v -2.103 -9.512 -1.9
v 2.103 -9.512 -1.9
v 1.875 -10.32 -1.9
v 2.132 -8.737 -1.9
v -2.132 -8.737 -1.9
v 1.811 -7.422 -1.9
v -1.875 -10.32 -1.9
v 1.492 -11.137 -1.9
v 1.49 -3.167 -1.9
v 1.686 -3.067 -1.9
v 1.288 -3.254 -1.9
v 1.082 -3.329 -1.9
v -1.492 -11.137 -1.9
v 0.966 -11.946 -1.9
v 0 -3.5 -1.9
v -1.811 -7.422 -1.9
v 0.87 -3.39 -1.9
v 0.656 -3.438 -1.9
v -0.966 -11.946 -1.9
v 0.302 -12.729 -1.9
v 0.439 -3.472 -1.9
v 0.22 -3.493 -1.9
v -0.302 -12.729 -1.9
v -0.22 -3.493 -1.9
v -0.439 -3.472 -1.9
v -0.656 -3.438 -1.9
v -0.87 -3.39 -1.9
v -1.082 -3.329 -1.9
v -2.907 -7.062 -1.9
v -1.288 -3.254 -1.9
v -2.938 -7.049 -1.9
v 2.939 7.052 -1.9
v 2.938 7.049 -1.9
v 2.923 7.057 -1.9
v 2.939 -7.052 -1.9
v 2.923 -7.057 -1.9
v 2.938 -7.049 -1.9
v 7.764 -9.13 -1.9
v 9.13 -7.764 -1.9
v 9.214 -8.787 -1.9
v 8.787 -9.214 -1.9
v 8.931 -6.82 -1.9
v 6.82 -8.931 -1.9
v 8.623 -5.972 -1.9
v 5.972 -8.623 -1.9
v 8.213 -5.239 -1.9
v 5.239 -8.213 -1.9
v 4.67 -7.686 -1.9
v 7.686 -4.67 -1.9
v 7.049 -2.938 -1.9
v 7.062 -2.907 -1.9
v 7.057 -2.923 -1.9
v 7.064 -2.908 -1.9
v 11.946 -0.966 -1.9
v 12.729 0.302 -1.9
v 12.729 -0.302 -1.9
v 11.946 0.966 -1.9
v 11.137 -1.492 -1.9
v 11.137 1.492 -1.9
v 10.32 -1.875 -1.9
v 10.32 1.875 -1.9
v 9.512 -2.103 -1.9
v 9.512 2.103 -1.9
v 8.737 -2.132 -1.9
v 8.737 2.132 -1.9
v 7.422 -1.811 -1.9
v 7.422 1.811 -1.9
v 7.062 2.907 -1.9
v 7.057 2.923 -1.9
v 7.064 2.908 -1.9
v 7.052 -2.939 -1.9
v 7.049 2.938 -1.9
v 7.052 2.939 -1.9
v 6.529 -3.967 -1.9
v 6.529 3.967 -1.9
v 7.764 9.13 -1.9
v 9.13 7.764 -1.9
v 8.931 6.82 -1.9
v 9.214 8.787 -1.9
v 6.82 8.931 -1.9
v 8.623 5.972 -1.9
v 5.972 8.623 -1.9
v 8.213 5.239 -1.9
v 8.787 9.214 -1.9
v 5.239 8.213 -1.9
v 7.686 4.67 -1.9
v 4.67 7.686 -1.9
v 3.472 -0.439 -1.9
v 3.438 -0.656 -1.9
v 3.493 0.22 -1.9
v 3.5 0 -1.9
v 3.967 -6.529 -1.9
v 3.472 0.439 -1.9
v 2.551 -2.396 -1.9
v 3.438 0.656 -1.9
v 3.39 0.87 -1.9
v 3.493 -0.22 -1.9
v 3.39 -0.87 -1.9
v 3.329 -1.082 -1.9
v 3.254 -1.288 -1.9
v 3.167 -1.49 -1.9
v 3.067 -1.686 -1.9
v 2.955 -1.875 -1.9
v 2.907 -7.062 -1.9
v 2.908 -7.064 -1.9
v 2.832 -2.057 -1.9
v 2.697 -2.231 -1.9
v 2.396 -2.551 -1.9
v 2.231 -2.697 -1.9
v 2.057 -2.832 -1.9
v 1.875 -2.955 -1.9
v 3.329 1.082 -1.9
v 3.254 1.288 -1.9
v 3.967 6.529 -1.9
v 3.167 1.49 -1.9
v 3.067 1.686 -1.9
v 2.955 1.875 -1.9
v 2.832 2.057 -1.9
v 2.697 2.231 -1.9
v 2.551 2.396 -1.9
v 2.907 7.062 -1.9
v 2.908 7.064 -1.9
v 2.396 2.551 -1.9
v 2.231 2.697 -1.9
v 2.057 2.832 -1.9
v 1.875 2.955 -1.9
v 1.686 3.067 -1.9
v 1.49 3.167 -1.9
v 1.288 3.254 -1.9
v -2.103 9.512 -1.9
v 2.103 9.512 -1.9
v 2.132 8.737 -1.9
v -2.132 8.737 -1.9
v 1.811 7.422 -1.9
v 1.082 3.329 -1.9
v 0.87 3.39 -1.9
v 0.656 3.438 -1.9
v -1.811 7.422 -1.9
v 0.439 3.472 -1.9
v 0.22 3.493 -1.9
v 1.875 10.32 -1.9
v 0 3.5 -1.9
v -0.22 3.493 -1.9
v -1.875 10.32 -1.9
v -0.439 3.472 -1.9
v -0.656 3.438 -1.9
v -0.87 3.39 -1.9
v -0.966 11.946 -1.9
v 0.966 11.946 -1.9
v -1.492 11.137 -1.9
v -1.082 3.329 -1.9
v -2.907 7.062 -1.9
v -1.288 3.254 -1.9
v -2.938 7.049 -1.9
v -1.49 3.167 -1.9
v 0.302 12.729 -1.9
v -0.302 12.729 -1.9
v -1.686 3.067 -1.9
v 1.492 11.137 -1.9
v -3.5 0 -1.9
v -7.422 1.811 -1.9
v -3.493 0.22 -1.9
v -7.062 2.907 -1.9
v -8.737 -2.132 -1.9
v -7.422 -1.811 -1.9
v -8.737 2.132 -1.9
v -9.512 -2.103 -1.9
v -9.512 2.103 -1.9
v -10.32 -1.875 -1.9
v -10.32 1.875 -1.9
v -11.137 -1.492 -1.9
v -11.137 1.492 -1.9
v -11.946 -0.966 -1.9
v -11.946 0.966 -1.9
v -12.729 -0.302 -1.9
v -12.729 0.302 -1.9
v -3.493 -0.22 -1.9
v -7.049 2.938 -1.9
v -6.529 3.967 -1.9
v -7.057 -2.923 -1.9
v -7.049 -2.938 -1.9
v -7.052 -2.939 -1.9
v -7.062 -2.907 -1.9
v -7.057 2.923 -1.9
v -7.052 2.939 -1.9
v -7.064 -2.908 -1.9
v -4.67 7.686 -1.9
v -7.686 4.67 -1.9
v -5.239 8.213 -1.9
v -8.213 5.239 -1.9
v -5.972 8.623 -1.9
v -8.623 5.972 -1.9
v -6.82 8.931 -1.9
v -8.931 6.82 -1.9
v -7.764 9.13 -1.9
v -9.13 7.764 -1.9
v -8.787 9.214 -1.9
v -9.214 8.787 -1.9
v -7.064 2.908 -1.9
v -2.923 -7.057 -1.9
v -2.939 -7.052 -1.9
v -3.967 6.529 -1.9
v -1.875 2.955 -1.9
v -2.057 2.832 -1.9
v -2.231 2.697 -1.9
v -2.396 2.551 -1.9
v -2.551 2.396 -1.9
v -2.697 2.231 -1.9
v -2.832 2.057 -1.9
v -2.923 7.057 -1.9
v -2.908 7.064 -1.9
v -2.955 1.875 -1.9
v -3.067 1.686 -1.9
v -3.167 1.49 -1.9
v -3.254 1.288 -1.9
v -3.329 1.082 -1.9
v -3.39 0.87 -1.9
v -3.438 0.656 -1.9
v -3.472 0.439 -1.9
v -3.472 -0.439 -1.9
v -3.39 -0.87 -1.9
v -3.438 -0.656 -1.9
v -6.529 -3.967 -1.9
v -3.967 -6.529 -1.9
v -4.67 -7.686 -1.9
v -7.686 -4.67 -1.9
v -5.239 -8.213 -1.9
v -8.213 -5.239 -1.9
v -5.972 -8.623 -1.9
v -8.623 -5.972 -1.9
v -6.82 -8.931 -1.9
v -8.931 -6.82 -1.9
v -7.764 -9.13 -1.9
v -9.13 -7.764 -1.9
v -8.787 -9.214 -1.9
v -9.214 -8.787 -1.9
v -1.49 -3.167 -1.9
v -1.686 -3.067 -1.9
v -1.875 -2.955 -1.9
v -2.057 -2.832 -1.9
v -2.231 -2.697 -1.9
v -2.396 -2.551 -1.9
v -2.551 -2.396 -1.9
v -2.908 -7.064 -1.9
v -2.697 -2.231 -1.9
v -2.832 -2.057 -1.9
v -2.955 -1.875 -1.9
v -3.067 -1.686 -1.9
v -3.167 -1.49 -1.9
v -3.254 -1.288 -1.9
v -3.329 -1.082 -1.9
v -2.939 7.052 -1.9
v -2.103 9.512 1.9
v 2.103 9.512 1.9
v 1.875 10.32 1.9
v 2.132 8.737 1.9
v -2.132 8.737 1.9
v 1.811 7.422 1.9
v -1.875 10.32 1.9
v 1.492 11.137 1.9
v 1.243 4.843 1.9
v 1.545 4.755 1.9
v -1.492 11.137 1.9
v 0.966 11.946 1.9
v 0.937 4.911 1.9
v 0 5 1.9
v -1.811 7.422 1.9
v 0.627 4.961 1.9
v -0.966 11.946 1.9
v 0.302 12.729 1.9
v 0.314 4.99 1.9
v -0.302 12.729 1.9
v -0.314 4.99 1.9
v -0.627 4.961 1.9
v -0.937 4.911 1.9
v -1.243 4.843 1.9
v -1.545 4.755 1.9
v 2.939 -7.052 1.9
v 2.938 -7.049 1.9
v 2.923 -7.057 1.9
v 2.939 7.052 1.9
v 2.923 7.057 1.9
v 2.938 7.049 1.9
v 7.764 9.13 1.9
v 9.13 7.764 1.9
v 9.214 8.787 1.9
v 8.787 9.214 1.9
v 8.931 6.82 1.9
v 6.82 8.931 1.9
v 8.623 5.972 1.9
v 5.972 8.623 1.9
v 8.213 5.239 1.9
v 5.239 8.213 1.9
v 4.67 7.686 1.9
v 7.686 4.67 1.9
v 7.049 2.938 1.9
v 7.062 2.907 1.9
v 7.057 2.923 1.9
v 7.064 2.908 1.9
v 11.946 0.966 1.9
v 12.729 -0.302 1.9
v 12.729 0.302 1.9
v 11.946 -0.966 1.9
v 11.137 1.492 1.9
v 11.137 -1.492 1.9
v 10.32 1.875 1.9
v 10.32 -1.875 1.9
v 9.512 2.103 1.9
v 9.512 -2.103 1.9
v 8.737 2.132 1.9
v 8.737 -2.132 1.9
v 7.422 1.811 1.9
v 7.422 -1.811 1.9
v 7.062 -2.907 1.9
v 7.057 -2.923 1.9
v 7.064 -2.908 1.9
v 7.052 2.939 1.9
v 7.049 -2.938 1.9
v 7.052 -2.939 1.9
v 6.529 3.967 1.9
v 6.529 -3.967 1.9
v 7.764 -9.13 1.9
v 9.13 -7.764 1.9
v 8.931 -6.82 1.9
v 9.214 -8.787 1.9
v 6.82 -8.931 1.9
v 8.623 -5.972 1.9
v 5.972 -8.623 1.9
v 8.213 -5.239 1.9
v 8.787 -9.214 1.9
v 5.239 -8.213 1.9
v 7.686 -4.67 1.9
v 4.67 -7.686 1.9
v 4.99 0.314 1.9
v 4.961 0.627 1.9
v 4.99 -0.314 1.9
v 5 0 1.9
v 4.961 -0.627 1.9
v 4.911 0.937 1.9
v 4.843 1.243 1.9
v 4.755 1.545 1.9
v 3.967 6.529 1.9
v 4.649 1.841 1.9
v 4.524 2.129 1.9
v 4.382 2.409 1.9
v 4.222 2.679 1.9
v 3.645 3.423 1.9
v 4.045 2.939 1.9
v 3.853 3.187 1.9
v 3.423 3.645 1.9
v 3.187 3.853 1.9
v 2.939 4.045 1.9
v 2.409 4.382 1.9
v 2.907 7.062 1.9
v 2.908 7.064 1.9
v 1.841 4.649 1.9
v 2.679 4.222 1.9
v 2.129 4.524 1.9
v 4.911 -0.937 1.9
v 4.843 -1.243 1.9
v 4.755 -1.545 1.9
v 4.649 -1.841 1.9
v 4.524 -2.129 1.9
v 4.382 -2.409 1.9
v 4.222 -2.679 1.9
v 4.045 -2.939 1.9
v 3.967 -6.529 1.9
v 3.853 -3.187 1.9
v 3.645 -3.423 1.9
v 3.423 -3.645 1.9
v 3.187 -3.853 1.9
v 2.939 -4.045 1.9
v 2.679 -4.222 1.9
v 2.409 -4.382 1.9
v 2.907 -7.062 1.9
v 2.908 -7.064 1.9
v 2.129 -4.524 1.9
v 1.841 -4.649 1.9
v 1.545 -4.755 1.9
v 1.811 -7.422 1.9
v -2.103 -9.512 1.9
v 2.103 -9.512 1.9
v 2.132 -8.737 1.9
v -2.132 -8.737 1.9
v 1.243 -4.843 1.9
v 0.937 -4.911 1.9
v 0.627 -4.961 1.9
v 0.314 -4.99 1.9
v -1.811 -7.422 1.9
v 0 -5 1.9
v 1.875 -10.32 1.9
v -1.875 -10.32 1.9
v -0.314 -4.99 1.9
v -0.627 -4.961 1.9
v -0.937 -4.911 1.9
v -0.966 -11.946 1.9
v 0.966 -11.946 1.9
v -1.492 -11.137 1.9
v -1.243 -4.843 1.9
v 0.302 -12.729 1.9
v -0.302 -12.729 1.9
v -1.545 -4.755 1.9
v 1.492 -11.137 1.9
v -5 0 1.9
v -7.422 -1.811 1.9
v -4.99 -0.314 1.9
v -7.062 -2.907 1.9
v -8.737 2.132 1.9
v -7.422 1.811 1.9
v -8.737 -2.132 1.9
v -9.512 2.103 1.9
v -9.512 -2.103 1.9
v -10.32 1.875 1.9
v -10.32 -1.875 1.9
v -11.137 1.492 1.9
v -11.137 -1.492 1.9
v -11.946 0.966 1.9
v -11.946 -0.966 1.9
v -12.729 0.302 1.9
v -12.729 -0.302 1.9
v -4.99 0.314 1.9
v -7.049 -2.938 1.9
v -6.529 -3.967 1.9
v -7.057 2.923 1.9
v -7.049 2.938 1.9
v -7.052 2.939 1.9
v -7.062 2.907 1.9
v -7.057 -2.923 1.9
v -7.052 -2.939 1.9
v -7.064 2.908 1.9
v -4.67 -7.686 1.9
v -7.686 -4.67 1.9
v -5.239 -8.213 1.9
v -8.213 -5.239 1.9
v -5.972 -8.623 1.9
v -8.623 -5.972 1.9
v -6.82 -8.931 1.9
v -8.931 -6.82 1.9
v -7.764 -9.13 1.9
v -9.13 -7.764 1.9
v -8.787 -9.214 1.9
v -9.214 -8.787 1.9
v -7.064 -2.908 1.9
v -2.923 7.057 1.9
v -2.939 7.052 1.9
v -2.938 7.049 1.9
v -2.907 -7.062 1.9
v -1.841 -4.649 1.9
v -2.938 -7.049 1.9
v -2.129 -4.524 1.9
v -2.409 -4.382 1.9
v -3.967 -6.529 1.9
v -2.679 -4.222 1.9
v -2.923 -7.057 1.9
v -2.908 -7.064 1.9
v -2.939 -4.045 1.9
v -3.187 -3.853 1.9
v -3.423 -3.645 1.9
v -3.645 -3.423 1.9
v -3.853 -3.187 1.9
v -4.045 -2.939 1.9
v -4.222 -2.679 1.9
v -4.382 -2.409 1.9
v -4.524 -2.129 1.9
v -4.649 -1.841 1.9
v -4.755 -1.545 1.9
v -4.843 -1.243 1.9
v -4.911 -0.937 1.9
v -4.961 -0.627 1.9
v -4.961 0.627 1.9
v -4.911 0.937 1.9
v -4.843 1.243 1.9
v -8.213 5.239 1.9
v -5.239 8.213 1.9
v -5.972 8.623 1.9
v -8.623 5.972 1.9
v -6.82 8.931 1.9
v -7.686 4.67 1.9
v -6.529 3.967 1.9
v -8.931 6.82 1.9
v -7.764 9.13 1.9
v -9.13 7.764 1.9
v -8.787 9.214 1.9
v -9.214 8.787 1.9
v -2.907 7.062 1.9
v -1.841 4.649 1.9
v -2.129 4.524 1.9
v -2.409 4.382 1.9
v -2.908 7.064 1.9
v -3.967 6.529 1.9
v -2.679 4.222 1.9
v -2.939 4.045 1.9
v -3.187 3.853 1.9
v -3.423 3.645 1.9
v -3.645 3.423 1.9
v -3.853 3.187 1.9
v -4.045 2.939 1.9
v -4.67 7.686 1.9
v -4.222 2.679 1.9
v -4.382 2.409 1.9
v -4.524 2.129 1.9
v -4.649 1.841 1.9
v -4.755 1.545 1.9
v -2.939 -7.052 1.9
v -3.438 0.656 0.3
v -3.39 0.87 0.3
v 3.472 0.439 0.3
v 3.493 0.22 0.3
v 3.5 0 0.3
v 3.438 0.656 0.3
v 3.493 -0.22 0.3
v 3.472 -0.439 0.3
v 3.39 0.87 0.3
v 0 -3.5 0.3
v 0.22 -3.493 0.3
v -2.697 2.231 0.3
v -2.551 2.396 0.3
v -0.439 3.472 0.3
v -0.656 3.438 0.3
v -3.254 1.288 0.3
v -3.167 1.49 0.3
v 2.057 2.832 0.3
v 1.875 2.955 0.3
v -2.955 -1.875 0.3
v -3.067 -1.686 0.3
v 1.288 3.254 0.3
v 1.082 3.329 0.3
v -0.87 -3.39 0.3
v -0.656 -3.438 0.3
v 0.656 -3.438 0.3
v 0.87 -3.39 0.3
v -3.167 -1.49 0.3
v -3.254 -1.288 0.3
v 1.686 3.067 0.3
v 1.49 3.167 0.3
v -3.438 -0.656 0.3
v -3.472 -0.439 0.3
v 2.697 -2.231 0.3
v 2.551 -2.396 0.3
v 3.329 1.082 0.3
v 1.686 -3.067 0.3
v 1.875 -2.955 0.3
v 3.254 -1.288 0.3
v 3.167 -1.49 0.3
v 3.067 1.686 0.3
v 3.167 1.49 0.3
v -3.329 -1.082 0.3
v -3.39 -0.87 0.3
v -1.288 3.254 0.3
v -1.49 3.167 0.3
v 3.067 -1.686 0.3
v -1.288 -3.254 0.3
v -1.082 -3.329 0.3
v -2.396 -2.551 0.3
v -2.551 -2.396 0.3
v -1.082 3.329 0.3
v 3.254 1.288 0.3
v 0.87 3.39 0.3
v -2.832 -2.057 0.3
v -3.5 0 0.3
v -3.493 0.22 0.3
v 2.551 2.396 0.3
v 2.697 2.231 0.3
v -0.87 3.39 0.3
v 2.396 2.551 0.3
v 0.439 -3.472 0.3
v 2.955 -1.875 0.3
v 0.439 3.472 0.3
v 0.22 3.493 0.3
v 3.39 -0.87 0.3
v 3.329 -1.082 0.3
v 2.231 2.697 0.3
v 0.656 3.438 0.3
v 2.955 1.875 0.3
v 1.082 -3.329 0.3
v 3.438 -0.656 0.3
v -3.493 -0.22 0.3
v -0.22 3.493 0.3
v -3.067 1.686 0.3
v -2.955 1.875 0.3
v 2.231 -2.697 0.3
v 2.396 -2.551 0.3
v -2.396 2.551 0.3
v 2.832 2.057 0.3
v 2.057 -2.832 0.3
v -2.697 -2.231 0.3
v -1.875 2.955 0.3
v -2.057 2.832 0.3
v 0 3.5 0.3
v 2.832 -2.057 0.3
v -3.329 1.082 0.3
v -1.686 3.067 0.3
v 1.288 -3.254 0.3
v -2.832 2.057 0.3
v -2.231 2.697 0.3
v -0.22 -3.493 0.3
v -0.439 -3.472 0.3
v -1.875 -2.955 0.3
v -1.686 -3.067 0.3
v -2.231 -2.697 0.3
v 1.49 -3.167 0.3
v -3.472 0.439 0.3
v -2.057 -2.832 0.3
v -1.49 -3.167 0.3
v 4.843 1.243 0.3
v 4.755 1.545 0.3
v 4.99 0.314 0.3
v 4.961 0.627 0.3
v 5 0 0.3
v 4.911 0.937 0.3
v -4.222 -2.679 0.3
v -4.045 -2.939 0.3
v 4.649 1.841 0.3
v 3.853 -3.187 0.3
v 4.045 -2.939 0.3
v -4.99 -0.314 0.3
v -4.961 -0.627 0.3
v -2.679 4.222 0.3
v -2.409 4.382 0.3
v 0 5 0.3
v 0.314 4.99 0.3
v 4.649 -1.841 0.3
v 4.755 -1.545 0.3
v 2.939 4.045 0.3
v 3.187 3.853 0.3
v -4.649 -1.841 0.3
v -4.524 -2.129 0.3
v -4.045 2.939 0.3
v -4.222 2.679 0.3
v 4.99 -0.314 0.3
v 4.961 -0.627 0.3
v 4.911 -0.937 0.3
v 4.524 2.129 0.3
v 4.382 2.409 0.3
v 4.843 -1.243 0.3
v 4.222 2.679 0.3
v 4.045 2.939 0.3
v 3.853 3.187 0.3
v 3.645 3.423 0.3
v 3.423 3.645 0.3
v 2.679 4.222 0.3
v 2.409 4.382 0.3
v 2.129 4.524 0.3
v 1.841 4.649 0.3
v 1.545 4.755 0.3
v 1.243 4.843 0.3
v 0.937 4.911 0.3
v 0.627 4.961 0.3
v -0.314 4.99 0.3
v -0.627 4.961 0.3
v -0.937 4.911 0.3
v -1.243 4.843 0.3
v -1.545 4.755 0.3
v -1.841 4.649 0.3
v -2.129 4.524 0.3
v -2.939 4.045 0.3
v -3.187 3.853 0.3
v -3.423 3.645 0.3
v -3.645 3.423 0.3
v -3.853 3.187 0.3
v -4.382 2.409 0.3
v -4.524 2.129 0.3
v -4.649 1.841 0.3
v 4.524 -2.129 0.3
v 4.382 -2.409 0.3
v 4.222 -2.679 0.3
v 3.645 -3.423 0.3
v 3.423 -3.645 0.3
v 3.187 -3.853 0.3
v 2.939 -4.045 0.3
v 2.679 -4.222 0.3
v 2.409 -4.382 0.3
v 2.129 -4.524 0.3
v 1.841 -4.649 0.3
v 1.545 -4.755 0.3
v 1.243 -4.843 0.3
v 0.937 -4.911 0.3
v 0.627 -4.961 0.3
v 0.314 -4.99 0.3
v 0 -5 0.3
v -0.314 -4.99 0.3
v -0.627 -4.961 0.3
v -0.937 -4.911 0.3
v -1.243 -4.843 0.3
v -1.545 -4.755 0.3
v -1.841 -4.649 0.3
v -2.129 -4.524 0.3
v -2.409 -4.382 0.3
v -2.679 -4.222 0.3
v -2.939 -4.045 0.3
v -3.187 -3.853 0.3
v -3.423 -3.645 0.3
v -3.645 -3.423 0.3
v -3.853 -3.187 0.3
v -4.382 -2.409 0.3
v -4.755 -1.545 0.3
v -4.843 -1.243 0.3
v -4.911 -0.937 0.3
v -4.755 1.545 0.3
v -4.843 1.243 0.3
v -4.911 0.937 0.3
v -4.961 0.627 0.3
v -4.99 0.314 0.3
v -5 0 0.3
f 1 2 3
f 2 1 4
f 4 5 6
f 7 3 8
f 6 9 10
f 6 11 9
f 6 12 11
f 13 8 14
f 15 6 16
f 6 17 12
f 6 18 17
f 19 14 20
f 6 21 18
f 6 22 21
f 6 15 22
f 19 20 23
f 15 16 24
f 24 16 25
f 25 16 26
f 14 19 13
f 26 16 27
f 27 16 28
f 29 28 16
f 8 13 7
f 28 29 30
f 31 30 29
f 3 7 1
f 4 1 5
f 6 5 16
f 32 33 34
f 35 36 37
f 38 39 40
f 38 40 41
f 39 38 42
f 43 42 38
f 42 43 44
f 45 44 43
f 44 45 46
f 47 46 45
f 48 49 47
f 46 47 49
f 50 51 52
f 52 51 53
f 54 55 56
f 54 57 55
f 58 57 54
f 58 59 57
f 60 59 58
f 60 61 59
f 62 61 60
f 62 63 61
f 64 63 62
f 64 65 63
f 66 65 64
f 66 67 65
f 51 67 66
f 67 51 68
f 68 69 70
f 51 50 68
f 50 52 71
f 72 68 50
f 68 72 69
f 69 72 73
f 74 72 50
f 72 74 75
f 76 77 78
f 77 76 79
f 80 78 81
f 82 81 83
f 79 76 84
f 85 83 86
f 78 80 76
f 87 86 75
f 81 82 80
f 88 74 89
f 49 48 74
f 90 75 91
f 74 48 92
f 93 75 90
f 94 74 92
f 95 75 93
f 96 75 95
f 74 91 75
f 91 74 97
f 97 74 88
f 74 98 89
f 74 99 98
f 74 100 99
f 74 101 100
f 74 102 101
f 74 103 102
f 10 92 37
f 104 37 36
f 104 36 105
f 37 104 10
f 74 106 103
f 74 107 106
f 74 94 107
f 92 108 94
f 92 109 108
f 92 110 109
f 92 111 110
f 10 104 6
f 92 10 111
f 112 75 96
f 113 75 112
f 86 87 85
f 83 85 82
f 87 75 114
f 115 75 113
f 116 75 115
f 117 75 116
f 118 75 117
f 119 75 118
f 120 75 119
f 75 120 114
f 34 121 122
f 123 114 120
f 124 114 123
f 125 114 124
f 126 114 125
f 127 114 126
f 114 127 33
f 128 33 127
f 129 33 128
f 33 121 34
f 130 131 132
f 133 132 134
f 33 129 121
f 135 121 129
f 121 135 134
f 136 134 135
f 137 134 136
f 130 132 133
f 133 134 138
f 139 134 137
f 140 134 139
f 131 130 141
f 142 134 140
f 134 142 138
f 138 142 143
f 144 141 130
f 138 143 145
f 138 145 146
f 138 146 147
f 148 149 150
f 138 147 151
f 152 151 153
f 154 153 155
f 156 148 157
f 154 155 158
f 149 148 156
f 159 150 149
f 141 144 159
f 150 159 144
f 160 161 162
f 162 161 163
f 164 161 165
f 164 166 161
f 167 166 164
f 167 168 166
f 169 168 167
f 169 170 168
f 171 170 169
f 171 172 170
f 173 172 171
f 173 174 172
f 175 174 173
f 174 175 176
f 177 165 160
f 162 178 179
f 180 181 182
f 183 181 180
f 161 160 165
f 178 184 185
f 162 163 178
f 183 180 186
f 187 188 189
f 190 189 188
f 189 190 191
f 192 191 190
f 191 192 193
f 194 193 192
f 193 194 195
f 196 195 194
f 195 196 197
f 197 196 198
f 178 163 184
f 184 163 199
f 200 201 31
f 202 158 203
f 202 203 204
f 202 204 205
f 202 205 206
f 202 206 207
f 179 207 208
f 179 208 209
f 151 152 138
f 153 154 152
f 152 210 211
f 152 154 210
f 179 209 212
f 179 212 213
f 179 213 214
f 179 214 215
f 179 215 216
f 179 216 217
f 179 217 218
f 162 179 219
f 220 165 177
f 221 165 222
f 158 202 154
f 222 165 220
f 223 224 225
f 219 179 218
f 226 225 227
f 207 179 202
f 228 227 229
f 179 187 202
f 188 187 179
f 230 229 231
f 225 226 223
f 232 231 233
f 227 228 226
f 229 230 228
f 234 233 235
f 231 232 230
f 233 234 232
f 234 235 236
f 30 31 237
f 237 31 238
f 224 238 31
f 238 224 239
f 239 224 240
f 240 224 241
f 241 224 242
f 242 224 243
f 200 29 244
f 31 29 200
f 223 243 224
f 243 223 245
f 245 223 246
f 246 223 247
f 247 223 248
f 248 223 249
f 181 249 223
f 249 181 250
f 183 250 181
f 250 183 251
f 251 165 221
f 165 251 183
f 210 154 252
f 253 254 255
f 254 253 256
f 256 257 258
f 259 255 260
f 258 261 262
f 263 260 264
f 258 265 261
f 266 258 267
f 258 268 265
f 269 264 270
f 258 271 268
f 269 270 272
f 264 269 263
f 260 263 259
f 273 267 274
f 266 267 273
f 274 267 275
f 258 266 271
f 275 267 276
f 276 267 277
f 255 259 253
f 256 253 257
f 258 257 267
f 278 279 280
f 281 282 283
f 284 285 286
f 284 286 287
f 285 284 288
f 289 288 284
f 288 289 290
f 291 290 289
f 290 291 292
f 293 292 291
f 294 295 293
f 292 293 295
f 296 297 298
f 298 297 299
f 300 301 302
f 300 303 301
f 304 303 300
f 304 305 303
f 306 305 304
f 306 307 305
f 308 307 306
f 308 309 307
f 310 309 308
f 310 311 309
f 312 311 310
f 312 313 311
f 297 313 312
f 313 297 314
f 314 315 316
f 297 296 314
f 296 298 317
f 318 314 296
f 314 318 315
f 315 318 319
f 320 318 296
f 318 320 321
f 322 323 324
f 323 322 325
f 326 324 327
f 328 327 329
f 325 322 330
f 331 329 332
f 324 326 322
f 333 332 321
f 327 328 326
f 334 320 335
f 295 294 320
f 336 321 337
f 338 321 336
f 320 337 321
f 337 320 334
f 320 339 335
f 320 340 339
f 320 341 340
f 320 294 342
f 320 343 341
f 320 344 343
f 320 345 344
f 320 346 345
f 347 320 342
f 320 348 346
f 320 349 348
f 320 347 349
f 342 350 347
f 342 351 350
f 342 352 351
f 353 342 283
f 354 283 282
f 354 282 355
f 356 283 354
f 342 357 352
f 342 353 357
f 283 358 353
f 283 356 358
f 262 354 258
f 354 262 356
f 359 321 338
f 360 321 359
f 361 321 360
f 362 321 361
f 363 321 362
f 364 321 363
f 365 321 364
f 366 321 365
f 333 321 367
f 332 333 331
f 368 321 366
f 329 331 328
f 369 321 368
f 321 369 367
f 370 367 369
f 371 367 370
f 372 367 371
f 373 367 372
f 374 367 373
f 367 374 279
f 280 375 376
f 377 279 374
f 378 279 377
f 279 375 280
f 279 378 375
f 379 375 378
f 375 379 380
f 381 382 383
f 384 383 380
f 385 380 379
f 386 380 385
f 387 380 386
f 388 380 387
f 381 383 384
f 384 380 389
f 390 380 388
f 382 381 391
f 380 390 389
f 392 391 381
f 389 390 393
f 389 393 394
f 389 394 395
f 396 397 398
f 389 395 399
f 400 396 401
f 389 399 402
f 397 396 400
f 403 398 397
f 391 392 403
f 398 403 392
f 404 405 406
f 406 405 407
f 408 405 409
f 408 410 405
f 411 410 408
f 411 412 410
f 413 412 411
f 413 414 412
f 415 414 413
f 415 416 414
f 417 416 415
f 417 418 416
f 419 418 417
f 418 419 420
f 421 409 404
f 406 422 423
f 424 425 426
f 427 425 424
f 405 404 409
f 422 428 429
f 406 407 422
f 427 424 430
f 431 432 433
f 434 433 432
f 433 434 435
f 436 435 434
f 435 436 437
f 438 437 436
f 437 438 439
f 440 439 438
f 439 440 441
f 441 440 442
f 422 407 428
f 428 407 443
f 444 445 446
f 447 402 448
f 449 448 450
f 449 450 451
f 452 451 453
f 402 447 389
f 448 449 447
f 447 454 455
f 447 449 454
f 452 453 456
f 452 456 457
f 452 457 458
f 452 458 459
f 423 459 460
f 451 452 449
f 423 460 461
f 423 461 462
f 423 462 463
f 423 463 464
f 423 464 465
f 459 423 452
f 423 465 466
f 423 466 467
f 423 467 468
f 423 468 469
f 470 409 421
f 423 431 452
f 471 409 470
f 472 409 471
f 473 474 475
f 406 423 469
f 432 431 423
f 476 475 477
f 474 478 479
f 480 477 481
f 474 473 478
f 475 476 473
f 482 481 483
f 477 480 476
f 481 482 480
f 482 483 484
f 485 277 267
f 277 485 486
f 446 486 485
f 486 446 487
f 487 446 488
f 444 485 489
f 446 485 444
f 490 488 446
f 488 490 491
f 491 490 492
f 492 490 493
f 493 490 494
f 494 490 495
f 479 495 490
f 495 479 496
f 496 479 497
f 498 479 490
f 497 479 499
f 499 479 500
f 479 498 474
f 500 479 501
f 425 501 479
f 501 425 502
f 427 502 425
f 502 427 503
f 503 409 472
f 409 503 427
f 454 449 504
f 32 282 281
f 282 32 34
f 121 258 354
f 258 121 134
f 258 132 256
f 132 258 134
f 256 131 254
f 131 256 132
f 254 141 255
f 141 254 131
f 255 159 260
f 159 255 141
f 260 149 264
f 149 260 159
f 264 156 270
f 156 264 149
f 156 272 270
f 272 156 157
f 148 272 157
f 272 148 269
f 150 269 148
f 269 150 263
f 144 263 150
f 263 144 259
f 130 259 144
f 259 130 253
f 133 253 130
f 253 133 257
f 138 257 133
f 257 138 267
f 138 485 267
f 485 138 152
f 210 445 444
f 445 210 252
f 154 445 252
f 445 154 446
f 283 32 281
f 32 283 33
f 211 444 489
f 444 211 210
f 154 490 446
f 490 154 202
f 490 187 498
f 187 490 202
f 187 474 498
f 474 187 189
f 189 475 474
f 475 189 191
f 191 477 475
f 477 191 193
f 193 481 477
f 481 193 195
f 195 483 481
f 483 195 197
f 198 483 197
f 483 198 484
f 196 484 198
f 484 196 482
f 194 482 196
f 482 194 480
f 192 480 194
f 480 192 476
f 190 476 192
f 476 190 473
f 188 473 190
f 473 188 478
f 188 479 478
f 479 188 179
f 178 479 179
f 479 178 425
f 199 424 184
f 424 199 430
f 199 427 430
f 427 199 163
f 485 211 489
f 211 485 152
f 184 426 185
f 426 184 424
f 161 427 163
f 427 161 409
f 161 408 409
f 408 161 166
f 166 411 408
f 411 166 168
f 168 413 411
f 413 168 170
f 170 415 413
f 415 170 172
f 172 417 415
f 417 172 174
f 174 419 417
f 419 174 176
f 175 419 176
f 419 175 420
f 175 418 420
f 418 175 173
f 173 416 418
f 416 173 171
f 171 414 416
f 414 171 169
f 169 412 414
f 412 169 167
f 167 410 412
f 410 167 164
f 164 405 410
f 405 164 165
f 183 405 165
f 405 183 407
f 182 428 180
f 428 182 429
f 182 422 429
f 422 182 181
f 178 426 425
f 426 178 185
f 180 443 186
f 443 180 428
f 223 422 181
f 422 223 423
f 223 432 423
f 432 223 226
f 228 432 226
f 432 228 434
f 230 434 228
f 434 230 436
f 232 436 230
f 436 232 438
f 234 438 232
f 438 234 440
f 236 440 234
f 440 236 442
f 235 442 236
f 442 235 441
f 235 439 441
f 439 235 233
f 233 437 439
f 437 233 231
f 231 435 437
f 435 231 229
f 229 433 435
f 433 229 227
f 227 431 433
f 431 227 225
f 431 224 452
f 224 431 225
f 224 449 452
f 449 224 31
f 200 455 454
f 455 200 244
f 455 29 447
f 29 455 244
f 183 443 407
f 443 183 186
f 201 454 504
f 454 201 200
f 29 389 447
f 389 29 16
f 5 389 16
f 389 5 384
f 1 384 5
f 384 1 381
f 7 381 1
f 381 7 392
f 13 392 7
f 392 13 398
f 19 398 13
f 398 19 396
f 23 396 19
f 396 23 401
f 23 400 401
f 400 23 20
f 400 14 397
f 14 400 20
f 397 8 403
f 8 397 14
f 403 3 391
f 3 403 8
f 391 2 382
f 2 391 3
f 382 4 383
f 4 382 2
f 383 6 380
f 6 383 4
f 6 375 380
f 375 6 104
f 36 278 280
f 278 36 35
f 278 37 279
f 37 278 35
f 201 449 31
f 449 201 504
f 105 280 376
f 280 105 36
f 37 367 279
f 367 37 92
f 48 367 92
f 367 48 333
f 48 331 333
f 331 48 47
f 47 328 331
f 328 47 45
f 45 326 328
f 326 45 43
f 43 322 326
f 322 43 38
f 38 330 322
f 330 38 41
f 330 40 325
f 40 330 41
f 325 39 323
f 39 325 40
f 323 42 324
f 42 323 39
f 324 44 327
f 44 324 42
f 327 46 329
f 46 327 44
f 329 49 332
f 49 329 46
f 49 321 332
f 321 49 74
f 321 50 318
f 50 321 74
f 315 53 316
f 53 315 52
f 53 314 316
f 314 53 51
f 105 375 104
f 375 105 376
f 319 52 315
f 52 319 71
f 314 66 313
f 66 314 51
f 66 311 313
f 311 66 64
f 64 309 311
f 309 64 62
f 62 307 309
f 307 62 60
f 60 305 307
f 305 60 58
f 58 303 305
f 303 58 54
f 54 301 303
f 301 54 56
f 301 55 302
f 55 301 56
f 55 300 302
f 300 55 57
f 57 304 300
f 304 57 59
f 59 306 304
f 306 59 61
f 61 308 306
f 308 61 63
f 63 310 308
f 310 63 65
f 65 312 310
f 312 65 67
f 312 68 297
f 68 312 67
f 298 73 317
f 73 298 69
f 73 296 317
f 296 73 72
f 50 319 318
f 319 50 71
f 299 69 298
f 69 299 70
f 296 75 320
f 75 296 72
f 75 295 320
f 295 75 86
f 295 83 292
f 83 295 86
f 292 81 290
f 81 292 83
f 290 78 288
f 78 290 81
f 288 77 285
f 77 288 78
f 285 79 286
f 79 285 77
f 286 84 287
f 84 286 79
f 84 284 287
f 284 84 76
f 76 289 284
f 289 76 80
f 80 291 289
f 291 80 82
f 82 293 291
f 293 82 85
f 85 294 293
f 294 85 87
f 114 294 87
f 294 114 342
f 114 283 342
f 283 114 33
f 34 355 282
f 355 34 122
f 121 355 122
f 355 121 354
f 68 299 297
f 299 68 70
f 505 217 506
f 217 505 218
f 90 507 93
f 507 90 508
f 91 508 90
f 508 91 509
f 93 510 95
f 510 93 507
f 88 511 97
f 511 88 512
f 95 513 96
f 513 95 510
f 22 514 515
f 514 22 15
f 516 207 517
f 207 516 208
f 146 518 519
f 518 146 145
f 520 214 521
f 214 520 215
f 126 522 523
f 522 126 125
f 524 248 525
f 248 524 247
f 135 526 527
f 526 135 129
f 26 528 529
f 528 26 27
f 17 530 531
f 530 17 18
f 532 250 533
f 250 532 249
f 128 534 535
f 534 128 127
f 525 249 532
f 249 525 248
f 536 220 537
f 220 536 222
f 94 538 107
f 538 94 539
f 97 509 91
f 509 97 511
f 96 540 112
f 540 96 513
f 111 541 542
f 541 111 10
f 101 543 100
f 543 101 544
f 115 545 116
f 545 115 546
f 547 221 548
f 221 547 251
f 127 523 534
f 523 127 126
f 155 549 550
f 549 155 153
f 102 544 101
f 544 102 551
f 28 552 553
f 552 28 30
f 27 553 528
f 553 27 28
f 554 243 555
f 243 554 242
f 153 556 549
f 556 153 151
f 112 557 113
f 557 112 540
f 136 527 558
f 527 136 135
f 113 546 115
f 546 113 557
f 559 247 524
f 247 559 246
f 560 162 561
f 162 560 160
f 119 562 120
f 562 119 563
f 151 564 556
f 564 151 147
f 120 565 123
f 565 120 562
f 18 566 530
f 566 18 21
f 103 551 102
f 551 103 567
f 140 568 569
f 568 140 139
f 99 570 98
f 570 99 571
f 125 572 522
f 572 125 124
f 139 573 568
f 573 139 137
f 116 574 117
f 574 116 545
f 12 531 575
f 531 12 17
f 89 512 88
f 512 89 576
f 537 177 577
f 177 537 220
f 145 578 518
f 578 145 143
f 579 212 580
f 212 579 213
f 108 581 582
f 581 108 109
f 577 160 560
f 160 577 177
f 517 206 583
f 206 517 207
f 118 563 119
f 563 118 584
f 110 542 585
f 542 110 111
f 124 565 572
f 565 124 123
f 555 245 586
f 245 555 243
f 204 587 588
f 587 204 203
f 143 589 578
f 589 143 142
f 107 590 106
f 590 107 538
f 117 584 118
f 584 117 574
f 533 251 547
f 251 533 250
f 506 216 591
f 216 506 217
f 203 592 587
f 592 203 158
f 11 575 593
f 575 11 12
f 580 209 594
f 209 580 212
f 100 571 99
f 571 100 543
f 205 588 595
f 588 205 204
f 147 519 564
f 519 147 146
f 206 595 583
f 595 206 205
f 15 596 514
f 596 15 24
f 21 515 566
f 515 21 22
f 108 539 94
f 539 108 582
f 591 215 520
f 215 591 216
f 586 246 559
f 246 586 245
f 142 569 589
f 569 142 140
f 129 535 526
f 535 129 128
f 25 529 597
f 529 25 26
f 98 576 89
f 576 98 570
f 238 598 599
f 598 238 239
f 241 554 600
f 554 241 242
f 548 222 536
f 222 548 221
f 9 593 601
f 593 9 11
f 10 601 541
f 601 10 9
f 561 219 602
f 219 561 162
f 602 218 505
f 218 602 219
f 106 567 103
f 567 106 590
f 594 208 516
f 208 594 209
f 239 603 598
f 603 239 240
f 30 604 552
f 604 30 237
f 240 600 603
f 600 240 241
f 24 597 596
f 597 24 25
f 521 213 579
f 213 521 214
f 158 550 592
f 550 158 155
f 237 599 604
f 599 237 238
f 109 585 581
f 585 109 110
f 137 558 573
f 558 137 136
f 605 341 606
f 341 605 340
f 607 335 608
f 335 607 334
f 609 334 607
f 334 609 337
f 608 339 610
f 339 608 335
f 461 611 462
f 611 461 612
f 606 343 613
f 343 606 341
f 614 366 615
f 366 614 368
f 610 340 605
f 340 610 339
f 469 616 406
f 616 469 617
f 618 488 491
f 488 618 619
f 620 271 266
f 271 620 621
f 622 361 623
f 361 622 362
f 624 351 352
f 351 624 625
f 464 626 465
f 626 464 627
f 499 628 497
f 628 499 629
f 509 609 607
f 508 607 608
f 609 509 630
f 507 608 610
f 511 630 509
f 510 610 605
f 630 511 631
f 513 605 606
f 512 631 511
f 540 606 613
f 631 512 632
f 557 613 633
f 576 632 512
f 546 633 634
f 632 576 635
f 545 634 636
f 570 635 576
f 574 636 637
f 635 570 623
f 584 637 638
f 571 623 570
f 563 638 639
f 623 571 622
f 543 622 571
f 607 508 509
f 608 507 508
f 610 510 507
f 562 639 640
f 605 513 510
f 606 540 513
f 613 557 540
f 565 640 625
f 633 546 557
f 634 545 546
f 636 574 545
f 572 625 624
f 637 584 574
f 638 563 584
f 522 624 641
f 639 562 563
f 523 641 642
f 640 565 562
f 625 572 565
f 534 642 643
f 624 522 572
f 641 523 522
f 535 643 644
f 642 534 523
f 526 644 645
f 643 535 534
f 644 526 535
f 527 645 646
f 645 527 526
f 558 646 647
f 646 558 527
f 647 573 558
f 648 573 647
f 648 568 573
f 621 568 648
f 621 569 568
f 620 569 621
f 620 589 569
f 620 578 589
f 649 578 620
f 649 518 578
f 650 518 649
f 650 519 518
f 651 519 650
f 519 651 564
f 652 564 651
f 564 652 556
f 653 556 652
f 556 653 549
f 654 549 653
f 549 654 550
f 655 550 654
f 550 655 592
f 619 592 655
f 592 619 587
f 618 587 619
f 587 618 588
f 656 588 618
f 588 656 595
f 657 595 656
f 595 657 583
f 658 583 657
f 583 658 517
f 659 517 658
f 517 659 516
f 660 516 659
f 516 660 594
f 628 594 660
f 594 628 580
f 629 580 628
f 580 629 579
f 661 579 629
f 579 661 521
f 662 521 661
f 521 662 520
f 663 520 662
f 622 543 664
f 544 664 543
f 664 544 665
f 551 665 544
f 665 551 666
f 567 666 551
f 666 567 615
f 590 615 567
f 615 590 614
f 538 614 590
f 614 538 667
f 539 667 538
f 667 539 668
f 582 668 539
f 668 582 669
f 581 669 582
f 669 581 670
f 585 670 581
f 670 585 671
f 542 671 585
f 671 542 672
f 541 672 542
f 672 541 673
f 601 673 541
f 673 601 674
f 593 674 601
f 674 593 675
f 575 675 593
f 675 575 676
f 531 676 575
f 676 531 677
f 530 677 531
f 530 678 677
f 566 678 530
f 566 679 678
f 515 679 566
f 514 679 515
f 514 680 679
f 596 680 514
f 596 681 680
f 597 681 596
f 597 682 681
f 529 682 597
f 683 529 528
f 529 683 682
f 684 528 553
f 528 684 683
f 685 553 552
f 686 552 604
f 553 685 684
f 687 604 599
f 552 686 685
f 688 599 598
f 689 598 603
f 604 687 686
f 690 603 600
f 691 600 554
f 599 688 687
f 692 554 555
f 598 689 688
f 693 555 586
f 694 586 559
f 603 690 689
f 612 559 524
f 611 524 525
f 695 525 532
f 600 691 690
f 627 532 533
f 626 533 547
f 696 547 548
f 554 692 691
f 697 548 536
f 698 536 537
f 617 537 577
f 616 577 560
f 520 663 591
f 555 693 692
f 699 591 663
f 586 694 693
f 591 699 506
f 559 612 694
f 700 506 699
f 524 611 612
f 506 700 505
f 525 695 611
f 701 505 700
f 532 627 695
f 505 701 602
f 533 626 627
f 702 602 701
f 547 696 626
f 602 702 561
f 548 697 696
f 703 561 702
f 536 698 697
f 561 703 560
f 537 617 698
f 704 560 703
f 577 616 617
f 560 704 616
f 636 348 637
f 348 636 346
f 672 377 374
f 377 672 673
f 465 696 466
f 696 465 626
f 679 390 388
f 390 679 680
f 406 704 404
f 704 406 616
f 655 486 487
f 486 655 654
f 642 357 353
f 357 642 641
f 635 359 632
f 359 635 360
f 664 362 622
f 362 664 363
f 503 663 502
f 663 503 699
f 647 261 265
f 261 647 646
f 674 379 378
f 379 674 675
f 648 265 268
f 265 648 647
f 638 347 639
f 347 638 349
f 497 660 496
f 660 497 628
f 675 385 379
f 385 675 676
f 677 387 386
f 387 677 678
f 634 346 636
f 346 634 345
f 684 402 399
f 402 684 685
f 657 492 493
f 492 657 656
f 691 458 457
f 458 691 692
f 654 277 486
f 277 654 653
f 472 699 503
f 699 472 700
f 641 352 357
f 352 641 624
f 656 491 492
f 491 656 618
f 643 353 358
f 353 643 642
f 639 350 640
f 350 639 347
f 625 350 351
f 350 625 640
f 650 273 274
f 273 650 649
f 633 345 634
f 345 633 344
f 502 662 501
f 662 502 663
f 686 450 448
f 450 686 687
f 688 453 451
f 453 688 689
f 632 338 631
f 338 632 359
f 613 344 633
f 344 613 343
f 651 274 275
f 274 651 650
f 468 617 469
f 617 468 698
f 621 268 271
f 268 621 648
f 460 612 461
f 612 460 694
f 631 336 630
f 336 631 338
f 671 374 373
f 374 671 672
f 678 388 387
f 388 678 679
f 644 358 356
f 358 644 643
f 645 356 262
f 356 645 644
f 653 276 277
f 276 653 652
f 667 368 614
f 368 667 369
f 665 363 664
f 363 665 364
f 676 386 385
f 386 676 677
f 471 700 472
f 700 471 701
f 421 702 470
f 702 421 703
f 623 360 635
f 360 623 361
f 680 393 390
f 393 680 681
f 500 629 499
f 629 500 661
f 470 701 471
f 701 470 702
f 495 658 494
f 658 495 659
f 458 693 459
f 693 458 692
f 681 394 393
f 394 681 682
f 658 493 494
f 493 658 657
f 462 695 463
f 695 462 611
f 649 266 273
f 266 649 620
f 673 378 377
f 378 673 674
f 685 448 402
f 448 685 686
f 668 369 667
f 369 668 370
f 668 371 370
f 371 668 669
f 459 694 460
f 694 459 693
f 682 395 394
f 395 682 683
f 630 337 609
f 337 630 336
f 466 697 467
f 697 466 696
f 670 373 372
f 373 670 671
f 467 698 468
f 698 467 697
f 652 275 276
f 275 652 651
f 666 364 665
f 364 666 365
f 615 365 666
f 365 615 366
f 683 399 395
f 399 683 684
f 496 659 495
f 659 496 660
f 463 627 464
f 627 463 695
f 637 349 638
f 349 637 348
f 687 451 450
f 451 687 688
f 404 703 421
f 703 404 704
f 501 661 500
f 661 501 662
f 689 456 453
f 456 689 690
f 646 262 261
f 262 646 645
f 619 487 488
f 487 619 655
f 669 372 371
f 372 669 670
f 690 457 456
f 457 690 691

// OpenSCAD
//////////////////////////////////////////////////////////////////////////////////////////////
// Public Domain Parametric Involute Spur Gear (and involute helical gear and involute rack)
// version 1.1
// by Leemon Baird, 2011, Leemon@Leemon.com
//http://www.thingiverse.com/thing:5505
//
// This file is public domain.  Use it for any purpose, including commercial
// applications.  Attribution would be nice, but is not required.  There is
// no warranty of any kind, including its correctness, usefulness, or safety.
// 
// This is parameterized involute spur (or helical) gear.  It is much simpler and less powerful than
// others on Thingiverse.  But it is public domain.  I implemented it from scratch from the 
// descriptions and equations on Wikipedia and the web, using Mathematica for calculations and testing,
// and I now release it into the public domain.
//
//		http://en.wikipedia.org/wiki/Involute_gear
//		http://en.wikipedia.org/wiki/Gear
//		http://en.wikipedia.org/wiki/List_of_gear_nomenclature
//		http://gtrebaol.free.fr/doc/catia/spur_gear.html
//		http://www.cs.cmu.edu/~rapidproto/mechanisms/chpt7.html
//
// The module gear() gives an involute spur gear, with reasonable defaults for all the parameters.
// Normally, you should just choose the first 4 parameters, and let the rest be default values.
// The module gear() gives a gear in the XY plane, centered on the origin, with one tooth centered on
// the positive Y axis.  The various functions below it take the same parameters, and return various
// measurements for the gear.  The most important is pitch_radius, which tells how far apart to space
// gears that are meshing, and adendum_radius, which gives the size of the region filled by the gear.
// A gear has a "pitch circle", which is an invisible circle that cuts through the middle of each
// tooth (though not the exact center). In order for two gears to mesh, their pitch circles should 
// just touch.  So the distance between their centers should be pitch_radius() for one, plus pitch_radius() 
// for the other, which gives the radii of their pitch circles.
//
// In order for two gears to mesh, they must have the same mm_per_tooth and pressure_angle parameters.  
// mm_per_tooth gives the number of millimeters of arc around the pitch circle covered by one tooth and one
// space between teeth.  The pitch angle controls how flat or bulged the sides of the teeth are.  Common
// values include 14.5 degrees and 20 degrees, and occasionally 25.  Though I've seen 28 recommended for
// plastic gears. Larger numbers bulge out more, giving stronger teeth, so 28 degrees is the default here.
//
// The ratio of number_of_teeth for two meshing gears gives how many times one will make a full 
// revolution when the the other makes one full revolution.  If the two numbers are coprime (i.e. 
// are not both divisible by the same number greater than 1), then every tooth on one gear
// will meet every tooth on the other, for more even wear.  So coprime numbers of teeth are good.
//
// The module rack() gives a rack, which is a bar with teeth.  A rack can mesh with any
// gear that has the same mm_per_tooth and pressure_angle.
//
// Some terminology: 
// The outline of a gear is a smooth circle (the "pitch circle") which has mountains and valleys
// added so it is toothed.  So there is an inner circle (the "root circle") that touches the 
// base of all the teeth, an outer circle that touches the tips of all the teeth,
// and the invisible pitch circle in between them.  There is also a "base circle", which can be smaller than
// all three of the others, which controls the shape of the teeth.  The side of each tooth lies on the path 
// that the end of a string would follow if it were wrapped tightly around the base circle, then slowly unwound.  
// That shape is an "involute", which gives this type of gear its name.
//
//////////////////////////////////////////////////////////////////////////////////////////////


$fn = 100;

//An involute spur gear, with reasonable defaults for all the parameters.
//Normally, you should just choose the first 4 parameters, and let the rest be default values.
//Meshing gears must match in mm_per_tooth, pressure_angle, and twist,
//and be separated by the sum of their pitch radii, which can be found with pitch_radius().
module gear (
	mm_per_tooth    = 3,    //this is the "circular pitch", the circumference of the pitch circle divided by the number of teeth
	number_of_teeth = 11,   //total number of teeth around the entire perimeter
	thickness       = 6,    //thickness of gear in mm
	hole_diameter   = 3,    //diameter of the hole in the center, in mm
	twist           = 0,    //teeth rotate this many degrees from bottom of gear to top.  360 makes the gear a screw with each thread going around once
	teeth_to_hide   = 0,    //number of teeth to delete to make this only a fraction of a circle
	pressure_angle  = 28,   //Controls how straight or bulged the tooth sides are. In degrees.
	clearance       = 0.0,  //gap between top of a tooth on one gear and bottom of valley on a meshing gear (in millimeters)
	backlash        = 0.0   //gap between two meshing teeth, in the direction along the circumference of the pitch circle
) {
	assign(pi = 3.1415926)
	assign(p  = mm_per_tooth * number_of_teeth / pi / 2)  //radius of pitch circle
	assign(c  = p + mm_per_tooth / pi - clearance)        //radius of outer circle
	assign(b  = p*cos(pressure_angle))                    //radius of base circle
	assign(r  = p-(c-p)-clearance)                        //radius of root circle
	assign(t  = mm_per_tooth/2-backlash/2)                //tooth thickness at pitch circle
	assign(k  = -iang(b, p) - t/2/p/pi*180) {             //angle to where involute meets base circle on each side of tooth
		difference() {
			for (i = [0:number_of_teeth-teeth_to_hide-1] )
				rotate([0,0,i*360/number_of_teeth])
					linear_extrude(height = thickness, center = true, convexity = 10, twist = twist)
						polygon(
							points=[
								[0, -hole_diameter/10],
								polar(r, -181/number_of_teeth),
								polar(r, r<b ? k : -180/number_of_teeth),
								q7(0/5,r,b,c,k, 1),q7(1/5,r,b,c,k, 1),q7(2/5,r,b,c,k, 1),q7(3/5,r,b,c,k, 1),q7(4/5,r,b,c,k, 1),q7(5/5,r,b,c,k, 1),
								q7(5/5,r,b,c,k,-1),q7(4/5,r,b,c,k,-1),q7(3/5,r,b,c,k,-1),q7(2/5,r,b,c,k,-1),q7(1/5,r,b,c,k,-1),q7(0/5,r,b,c,k,-1),
								polar(r, r<b ? -k : 180/number_of_teeth),
								polar(r, 181/number_of_teeth)
							],
 							paths=[[0,1,2,3,4,5,6,7,8,9,10,11,12,13,14,15,16]]
						);
			cylinder(h=2*thickness+1, r=hole_diameter/2, center=true);
		}
	}
};	
//these 4 functions are used by gear
function polar(r,theta)   = r*[sin(theta), cos(theta)];                            //convert polar to cartesian coordinates
function iang(r1,r2)      = sqrt((r2/r1)*(r2/r1) - 1)/3.1415926*180 - acos(r1/r2); //unwind a string this many degrees to go from radius r1 to radius r2
function q7(f,r,b,r2,t,s) = q6(b,s,t,(1-f)*max(b,r)+f*r2);                         //radius a fraction f up the curved side of the tooth 
function q6(b,s,t,d)      = polar(d,s*(iang(b,d)+t));                              //point at radius d on the involute curve

//a rack, which is a straight line with teeth (the same as a segment from a giant gear with a huge number of teeth).
//The "pitch circle" is a line along the X axis.
module rack (
	mm_per_tooth    = 3,    //this is the "circular pitch", the circumference of the pitch circle divided by the number of teeth
	number_of_teeth = 11,   //total number of teeth along the rack
	thickness       = 6,    //thickness of rack in mm (affects each tooth)
	height          = 120,   //height of rack in mm, from tooth top to far side of rack.
	pressure_angle  = 28,   //Controls how straight or bulged the tooth sides are. In degrees.
	backlash        = 0.0   //gap between two meshing teeth, in the direction along the circumference of the pitch circle
) {
	assign(pi = 3.1415926)
	assign(a = mm_per_tooth / pi) //addendum
	assign(t = a*cos(pressure_angle)-1)         //tooth side is tilted so top/bottom corners move this amount
		for (i = [0:number_of_teeth-1] )
			translate([i*mm_per_tooth,0,0])
				linear_extrude(height = thickness, center = true, convexity = 10)
					polygon(
						points=[
							[-mm_per_tooth * 3/4,                 a-height],
							[-mm_per_tooth * 3/4 - backlash,     -a],
							[-mm_per_tooth * 1/4 + backlash - t, -a],
							[-mm_per_tooth * 1/4 + backlash + t,  a],
							[ mm_per_tooth * 1/4 - backlash - t,  a],
							[ mm_per_tooth * 1/4 - backlash + t, -a],
							[ mm_per_tooth * 3/4 + backlash,     -a],
							[ mm_per_tooth * 3/4,                 a-height],
						],
						paths=[[0,1,2,3,4,5,6,7]]
					);
};	

//These 5 functions let the user find the derived dimensions of the gear.
//A gear fits within a circle of radius outer_radius, and two gears should have
//their centers separated by the sum of their pictch_radius.
function circular_pitch  (mm_per_tooth=3) = mm_per_tooth;                     //tooth density expressed as "circular pitch" in millimeters
function diametral_pitch (mm_per_tooth=3) = 3.1415926 / mm_per_tooth;         //tooth density expressed as "diametral pitch" in teeth per millimeter
function module_value    (mm_per_tooth=3) = mm_per_tooth / pi;                //tooth density expressed as "module" or "modulus" in millimeters
function pitch_radius    (mm_per_tooth=3,number_of_teeth=11) = mm_per_tooth * number_of_teeth / 3.1415926 / 2;
function outer_radius    (mm_per_tooth=3,number_of_teeth=11,clearance=0.1)    //The gear fits entirely within a cylinder of this radius.
	= mm_per_tooth*(1+number_of_teeth/2)/3.1415926  - clearance;              

//////////////////////////////////////////////////////////////////////////////////////////////
//example gear train.  
//Try it with OpenSCAD View/Animate command with 20 steps and 24 FPS.
//The gears will continue to be rotated to mesh correctly if you change the number of teeth.

n1 = 11; //red gear number of teeth
n2 = 20; //green gear
n3 = 5;  //blue gear
n4 = 20; //orange gear
n5 = 8;  //gray rack
mm_per_tooth = 9; //all meshing gears need the same mm_per_tooth (and the same pressure_angle)

hole         = 3;
height       = 12;

d1 =pitch_radius(mm_per_tooth,n1);
d12=pitch_radius(mm_per_tooth,n1) + pitch_radius(mm_per_tooth,n2);
d13=pitch_radius(mm_per_tooth,n1) + pitch_radius(mm_per_tooth,n3);
d14=pitch_radius(mm_per_tooth,n1) + pitch_radius(mm_per_tooth,n4);


thickness    = 3.80;
hole1 = 7;
hole2 = 10;
hole2_depth = 1.6;
hole2_tr = 0.5*(thickness - hole2_depth);

difference() {
  gear(8.0, 8, thickness, hole1);
  translate([0, 0, hole2_tr]) cylinder(h=hole2_depth, d=hole2, center=true);
}

//translate([0, 0, -2]) color([1.00,0.75,0.75]) cylinder(d=15.4, h=thickness, center=true);
//translate([0, 0, 2]) color([0.75,1.00,0.75]) cylinder(d=25.6, h=thickness, center=true);


//translate([ 0,    0, 0]) rotate([0,0, $t*360/n1])                 color([1.00,0.75,0.75]) gear(mm_per_tooth,n1,thickness,hole);
//translate([ 0,  d12, 0]) rotate([0,0,-($t+n2/2-0*n1+1/2)*360/n2]) color([0.75,1.00,0.75]) gear(mm_per_tooth,n2,thickness,hole,0,108);
//translate([ d13,  0, 0]) rotate([0,0,-($t-n3/4+n1/4+1/2)*360/n3]) color([0.75,0.75,1.00]) gear(mm_per_tooth,n3,thickness,hole);
//translate([ d13,  0, 0]) rotate([0,0,-($t-n3/4+n1/4+1/2)*360/n3]) color([0.75,0.75,1.00]) gear(mm_per_tooth,n3,thickness,hole);
//translate([-d14,  0, 0]) rotate([0,0,-($t-n4/4-n1/4+1/2-floor(n4/4)-3)*360/n4]) color([1.00,0.75,0.50]) gear(mm_per_tooth,n4,thickness,hole,0,n4-3);
//translate([(-floor(n5/2)-floor(n1/2)+$t+n1/2-1/2)*9, -d1+0.0, 0]) rotate([0,0,0]) color([0.75,0.75,0.75]) rack(mm_per_tooth,n5,thickness,height);
